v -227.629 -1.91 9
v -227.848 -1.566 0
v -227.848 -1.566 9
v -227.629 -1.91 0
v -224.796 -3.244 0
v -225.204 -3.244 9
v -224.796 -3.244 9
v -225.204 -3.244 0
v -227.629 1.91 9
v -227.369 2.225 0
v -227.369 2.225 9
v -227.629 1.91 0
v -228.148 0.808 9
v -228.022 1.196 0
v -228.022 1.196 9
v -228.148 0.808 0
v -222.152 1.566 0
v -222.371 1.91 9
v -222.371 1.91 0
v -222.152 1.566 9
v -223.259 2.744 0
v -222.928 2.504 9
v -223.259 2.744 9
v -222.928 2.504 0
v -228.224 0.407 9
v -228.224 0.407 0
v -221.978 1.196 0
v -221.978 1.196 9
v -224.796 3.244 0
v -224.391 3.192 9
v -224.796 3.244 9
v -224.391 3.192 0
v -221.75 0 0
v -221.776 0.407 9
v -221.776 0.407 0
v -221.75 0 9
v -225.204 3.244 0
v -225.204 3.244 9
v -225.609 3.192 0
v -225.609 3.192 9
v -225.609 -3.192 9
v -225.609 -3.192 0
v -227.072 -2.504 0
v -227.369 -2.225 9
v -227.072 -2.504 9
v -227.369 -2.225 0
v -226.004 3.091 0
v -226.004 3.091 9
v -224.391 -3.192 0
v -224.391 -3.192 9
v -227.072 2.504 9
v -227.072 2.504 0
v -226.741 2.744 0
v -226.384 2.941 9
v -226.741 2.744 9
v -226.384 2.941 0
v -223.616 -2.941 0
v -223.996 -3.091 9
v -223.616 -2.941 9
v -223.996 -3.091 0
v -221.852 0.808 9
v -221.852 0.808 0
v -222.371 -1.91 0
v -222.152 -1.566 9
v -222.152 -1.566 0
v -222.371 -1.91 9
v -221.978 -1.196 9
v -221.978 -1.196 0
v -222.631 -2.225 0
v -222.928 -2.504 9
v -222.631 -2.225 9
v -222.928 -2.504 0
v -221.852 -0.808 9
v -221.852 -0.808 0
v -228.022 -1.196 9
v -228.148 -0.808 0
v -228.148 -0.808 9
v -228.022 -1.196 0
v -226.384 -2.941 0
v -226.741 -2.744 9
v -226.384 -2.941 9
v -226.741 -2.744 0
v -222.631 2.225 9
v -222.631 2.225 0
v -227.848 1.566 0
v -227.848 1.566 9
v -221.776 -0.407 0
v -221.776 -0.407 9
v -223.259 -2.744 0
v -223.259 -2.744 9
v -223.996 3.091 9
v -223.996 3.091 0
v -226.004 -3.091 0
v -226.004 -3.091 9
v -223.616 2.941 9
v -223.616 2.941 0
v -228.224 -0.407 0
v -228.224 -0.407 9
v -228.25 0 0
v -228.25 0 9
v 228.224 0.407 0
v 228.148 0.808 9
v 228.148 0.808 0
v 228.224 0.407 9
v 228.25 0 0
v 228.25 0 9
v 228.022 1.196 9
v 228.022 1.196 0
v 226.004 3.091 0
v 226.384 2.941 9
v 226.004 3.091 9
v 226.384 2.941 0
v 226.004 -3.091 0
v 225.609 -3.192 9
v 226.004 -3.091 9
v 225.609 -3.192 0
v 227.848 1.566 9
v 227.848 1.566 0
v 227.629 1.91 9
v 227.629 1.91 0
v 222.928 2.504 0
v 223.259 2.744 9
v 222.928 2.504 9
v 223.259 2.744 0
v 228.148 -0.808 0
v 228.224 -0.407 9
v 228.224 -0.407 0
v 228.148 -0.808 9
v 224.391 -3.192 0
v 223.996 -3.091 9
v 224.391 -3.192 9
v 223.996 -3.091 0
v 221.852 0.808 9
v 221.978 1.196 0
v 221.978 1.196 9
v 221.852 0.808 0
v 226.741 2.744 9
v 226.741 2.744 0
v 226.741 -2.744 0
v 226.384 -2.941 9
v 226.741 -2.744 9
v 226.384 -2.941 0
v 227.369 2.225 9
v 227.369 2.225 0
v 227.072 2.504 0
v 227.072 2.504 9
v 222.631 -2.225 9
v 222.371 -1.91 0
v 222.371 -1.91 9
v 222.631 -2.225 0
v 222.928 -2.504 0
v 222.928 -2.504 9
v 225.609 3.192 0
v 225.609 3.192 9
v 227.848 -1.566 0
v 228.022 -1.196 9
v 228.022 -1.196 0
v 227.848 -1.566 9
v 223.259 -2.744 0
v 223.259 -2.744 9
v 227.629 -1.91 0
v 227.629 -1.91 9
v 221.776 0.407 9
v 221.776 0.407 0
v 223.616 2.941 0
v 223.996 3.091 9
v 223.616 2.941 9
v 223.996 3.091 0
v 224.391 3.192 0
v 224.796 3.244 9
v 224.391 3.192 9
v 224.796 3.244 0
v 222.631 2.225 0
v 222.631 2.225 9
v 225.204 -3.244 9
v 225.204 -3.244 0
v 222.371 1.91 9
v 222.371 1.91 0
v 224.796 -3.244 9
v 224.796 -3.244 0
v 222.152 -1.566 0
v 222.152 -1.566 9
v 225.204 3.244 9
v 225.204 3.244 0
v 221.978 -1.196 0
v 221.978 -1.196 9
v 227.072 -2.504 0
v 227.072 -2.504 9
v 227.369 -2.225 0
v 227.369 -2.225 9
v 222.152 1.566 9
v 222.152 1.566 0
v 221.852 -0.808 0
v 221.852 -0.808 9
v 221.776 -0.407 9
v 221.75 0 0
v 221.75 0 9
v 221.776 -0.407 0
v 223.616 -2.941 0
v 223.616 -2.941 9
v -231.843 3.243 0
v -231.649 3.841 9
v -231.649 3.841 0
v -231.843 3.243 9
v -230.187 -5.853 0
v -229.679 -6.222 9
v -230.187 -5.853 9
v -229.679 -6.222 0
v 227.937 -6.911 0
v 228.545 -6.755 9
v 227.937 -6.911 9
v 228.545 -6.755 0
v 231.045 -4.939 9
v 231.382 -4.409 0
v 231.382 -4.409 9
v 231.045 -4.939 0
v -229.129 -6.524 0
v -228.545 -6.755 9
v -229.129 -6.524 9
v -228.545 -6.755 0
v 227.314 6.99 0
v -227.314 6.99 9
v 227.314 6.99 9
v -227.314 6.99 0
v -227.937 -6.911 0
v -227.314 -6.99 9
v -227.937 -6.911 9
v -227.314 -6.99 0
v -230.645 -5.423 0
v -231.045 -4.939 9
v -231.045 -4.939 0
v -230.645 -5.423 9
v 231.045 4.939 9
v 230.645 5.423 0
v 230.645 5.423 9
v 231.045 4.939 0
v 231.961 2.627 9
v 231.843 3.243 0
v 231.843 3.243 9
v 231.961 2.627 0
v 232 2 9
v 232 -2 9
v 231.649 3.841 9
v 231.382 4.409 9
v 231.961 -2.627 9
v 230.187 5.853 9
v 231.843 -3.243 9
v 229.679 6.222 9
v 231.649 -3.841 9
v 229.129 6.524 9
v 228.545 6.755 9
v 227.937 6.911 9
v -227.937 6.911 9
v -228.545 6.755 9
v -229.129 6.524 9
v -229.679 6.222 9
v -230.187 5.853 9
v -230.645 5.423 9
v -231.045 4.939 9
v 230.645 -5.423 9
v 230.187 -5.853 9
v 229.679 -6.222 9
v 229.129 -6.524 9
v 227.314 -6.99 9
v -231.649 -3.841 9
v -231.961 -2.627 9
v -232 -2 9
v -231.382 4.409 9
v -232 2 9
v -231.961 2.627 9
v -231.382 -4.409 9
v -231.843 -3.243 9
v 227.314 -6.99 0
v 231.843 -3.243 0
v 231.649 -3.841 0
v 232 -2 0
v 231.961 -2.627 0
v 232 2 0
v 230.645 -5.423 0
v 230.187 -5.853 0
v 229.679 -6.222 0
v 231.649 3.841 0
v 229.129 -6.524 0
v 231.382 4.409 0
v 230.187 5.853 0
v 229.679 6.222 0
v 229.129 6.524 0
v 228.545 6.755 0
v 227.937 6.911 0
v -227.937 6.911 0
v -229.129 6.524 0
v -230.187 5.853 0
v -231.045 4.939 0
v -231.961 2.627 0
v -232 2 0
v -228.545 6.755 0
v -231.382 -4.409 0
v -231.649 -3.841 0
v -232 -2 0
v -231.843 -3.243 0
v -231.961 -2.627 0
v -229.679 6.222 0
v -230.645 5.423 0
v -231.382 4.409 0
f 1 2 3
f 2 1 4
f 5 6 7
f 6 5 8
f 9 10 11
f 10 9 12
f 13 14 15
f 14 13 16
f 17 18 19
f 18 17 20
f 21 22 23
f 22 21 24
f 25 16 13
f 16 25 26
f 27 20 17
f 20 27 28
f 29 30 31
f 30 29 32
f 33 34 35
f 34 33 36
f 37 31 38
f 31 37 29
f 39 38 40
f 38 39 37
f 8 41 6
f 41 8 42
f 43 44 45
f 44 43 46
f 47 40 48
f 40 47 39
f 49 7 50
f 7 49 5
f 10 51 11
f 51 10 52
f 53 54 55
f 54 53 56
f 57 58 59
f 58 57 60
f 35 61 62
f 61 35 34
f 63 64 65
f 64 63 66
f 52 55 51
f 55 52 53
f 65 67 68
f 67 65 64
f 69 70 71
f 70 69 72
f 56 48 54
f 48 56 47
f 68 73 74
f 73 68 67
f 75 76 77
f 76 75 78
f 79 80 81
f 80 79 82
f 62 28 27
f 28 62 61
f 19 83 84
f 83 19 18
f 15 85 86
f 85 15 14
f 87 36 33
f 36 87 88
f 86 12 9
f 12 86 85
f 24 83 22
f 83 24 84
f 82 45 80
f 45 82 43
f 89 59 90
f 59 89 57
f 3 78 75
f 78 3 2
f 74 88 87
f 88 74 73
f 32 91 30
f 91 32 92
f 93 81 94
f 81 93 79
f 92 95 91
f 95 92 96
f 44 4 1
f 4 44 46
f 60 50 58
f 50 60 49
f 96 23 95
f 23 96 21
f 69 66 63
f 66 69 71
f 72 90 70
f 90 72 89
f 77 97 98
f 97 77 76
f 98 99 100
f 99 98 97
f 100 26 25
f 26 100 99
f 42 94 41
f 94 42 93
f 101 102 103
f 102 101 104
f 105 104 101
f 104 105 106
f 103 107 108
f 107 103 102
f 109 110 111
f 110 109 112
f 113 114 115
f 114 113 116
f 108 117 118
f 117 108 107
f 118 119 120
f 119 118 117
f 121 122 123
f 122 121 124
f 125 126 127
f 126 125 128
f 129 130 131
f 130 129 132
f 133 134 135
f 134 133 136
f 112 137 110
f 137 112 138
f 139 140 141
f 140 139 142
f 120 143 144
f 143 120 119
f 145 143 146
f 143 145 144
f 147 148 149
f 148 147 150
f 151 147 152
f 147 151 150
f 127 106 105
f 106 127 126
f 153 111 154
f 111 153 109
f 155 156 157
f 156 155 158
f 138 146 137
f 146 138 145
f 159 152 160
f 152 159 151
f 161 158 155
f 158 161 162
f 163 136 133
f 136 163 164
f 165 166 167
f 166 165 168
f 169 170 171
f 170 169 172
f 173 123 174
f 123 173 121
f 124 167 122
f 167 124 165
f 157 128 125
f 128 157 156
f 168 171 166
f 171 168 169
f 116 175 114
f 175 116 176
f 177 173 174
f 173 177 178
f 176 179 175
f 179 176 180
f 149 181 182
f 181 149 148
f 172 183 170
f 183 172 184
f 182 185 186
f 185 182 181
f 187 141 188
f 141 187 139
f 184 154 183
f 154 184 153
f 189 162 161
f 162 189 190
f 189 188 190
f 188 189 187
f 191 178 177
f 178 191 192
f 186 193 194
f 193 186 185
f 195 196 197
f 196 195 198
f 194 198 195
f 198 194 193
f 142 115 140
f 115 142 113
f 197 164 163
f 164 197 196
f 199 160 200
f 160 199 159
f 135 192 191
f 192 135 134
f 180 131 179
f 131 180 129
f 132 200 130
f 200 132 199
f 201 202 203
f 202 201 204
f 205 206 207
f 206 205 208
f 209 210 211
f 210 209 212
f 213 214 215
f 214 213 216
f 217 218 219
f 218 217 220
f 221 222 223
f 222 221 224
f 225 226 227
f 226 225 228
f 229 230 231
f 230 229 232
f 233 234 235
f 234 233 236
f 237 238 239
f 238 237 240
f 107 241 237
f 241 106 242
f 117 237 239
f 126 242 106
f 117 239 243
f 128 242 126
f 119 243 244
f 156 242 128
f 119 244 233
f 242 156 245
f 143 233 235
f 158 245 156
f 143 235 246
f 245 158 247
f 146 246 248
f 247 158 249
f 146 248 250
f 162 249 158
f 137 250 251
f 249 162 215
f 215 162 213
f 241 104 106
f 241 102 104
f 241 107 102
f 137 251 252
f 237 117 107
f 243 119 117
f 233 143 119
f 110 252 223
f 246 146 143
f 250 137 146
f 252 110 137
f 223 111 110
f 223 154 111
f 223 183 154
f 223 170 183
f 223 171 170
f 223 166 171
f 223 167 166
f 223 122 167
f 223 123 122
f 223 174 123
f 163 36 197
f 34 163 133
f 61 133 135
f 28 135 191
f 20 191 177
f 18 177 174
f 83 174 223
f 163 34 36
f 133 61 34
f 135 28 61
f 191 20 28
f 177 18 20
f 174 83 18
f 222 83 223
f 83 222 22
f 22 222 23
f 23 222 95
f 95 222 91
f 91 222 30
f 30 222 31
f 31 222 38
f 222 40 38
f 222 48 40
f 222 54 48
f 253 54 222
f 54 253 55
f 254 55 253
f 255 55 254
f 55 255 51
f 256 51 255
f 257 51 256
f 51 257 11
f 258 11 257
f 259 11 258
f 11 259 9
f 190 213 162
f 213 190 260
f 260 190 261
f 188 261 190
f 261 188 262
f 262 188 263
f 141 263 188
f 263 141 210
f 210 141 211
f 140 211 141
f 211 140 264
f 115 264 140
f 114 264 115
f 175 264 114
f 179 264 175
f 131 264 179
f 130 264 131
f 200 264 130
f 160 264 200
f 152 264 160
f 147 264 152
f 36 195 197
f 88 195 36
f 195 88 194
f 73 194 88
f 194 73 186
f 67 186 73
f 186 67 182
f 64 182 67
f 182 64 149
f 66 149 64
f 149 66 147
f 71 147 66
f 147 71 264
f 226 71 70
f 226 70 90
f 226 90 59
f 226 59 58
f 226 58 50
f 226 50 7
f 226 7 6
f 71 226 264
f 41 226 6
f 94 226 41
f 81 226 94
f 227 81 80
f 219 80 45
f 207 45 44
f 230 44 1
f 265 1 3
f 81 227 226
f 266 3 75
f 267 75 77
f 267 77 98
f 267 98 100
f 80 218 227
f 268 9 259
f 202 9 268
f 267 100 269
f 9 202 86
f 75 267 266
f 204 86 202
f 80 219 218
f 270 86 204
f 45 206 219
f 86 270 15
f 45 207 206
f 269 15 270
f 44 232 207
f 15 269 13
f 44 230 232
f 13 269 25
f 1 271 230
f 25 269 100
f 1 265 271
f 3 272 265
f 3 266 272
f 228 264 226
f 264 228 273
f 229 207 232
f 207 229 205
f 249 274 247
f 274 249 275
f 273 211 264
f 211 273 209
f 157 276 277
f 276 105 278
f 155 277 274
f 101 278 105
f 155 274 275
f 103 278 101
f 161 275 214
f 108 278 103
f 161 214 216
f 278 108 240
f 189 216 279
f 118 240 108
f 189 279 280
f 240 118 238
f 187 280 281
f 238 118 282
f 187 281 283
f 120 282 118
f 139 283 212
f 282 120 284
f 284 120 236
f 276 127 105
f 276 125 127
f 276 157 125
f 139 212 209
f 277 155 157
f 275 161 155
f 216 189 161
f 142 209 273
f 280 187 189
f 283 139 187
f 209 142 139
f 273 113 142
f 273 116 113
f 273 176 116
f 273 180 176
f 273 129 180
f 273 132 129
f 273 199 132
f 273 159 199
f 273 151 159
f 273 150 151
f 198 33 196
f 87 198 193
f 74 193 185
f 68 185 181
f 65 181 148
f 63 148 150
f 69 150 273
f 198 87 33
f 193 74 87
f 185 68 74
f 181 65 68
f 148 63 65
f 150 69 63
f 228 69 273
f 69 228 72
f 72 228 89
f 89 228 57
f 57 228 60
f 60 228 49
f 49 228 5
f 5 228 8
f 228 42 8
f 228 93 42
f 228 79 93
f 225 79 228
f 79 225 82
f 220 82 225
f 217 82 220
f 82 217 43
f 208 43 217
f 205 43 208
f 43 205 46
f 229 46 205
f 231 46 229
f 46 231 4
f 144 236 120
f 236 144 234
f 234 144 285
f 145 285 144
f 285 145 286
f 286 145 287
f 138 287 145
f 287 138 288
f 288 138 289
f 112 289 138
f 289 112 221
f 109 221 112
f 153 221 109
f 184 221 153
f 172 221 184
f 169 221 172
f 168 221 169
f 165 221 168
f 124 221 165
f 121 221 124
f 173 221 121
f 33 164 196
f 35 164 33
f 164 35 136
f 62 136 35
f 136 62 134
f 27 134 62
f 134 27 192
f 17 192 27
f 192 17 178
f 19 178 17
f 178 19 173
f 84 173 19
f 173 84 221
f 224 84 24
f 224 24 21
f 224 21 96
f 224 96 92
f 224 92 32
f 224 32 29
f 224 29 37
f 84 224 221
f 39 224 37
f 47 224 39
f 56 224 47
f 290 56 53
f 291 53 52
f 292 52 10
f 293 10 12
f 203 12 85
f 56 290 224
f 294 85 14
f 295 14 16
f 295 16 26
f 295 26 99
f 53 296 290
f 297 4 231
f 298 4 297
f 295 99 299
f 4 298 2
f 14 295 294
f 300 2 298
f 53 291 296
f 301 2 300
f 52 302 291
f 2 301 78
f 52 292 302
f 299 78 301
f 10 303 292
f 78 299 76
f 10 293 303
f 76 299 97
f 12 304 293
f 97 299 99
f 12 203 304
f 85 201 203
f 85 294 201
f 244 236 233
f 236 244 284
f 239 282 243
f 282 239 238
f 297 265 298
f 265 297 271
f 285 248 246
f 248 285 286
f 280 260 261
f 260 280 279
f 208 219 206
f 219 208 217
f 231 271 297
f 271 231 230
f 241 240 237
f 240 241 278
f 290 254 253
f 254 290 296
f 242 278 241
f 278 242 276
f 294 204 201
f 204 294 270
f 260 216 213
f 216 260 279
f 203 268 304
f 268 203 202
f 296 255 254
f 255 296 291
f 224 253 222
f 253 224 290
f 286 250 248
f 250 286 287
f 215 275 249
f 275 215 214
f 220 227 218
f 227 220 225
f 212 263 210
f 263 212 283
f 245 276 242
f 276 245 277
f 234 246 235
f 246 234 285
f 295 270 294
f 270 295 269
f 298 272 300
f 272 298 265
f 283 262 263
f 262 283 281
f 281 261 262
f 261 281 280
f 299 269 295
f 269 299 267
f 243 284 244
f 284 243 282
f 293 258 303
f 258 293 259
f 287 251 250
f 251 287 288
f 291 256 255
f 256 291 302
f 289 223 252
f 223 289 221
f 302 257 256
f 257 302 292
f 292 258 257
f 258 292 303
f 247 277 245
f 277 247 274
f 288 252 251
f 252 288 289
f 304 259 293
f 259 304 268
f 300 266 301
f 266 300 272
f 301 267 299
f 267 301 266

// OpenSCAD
$fn = 50;


difference() {
	union() {
		hull() {
			translate(v = [-227.0000000000, 2.0000000000, 0]) {
				cylinder(h = 9, r = 5);
			}
			translate(v = [227.0000000000, 2.0000000000, 0]) {
				cylinder(h = 9, r = 5);
			}
			translate(v = [-227.0000000000, -2.0000000000, 0]) {
				cylinder(h = 9, r = 5);
			}
			translate(v = [227.0000000000, -2.0000000000, 0]) {
				cylinder(h = 9, r = 5);
			}
		}
	}
	union() {
		translate(v = [-225.0000000000, 0.0000000000, -100.0000000000]) {
			cylinder(h = 200, r = 3.2500000000);
		}
		translate(v = [-225.0000000000, 0.0000000000, -100.0000000000]) {
			cylinder(h = 200, r = 3.2500000000);
		}
		translate(v = [225.0000000000, 0.0000000000, -100.0000000000]) {
			cylinder(h = 200, r = 3.2500000000);
		}
		translate(v = [225.0000000000, 0.0000000000, -100.0000000000]) {
			cylinder(h = 200, r = 3.2500000000);
		}
	}
}
